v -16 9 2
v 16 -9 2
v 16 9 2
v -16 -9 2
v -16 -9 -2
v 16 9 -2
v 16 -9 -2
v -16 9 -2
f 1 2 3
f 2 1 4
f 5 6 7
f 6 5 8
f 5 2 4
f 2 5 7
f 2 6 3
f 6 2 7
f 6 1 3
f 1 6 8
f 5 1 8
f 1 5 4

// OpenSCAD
width_mm = 32;
depth_mm = 18;
cube([width_mm, depth_mm, 4], center=true);
